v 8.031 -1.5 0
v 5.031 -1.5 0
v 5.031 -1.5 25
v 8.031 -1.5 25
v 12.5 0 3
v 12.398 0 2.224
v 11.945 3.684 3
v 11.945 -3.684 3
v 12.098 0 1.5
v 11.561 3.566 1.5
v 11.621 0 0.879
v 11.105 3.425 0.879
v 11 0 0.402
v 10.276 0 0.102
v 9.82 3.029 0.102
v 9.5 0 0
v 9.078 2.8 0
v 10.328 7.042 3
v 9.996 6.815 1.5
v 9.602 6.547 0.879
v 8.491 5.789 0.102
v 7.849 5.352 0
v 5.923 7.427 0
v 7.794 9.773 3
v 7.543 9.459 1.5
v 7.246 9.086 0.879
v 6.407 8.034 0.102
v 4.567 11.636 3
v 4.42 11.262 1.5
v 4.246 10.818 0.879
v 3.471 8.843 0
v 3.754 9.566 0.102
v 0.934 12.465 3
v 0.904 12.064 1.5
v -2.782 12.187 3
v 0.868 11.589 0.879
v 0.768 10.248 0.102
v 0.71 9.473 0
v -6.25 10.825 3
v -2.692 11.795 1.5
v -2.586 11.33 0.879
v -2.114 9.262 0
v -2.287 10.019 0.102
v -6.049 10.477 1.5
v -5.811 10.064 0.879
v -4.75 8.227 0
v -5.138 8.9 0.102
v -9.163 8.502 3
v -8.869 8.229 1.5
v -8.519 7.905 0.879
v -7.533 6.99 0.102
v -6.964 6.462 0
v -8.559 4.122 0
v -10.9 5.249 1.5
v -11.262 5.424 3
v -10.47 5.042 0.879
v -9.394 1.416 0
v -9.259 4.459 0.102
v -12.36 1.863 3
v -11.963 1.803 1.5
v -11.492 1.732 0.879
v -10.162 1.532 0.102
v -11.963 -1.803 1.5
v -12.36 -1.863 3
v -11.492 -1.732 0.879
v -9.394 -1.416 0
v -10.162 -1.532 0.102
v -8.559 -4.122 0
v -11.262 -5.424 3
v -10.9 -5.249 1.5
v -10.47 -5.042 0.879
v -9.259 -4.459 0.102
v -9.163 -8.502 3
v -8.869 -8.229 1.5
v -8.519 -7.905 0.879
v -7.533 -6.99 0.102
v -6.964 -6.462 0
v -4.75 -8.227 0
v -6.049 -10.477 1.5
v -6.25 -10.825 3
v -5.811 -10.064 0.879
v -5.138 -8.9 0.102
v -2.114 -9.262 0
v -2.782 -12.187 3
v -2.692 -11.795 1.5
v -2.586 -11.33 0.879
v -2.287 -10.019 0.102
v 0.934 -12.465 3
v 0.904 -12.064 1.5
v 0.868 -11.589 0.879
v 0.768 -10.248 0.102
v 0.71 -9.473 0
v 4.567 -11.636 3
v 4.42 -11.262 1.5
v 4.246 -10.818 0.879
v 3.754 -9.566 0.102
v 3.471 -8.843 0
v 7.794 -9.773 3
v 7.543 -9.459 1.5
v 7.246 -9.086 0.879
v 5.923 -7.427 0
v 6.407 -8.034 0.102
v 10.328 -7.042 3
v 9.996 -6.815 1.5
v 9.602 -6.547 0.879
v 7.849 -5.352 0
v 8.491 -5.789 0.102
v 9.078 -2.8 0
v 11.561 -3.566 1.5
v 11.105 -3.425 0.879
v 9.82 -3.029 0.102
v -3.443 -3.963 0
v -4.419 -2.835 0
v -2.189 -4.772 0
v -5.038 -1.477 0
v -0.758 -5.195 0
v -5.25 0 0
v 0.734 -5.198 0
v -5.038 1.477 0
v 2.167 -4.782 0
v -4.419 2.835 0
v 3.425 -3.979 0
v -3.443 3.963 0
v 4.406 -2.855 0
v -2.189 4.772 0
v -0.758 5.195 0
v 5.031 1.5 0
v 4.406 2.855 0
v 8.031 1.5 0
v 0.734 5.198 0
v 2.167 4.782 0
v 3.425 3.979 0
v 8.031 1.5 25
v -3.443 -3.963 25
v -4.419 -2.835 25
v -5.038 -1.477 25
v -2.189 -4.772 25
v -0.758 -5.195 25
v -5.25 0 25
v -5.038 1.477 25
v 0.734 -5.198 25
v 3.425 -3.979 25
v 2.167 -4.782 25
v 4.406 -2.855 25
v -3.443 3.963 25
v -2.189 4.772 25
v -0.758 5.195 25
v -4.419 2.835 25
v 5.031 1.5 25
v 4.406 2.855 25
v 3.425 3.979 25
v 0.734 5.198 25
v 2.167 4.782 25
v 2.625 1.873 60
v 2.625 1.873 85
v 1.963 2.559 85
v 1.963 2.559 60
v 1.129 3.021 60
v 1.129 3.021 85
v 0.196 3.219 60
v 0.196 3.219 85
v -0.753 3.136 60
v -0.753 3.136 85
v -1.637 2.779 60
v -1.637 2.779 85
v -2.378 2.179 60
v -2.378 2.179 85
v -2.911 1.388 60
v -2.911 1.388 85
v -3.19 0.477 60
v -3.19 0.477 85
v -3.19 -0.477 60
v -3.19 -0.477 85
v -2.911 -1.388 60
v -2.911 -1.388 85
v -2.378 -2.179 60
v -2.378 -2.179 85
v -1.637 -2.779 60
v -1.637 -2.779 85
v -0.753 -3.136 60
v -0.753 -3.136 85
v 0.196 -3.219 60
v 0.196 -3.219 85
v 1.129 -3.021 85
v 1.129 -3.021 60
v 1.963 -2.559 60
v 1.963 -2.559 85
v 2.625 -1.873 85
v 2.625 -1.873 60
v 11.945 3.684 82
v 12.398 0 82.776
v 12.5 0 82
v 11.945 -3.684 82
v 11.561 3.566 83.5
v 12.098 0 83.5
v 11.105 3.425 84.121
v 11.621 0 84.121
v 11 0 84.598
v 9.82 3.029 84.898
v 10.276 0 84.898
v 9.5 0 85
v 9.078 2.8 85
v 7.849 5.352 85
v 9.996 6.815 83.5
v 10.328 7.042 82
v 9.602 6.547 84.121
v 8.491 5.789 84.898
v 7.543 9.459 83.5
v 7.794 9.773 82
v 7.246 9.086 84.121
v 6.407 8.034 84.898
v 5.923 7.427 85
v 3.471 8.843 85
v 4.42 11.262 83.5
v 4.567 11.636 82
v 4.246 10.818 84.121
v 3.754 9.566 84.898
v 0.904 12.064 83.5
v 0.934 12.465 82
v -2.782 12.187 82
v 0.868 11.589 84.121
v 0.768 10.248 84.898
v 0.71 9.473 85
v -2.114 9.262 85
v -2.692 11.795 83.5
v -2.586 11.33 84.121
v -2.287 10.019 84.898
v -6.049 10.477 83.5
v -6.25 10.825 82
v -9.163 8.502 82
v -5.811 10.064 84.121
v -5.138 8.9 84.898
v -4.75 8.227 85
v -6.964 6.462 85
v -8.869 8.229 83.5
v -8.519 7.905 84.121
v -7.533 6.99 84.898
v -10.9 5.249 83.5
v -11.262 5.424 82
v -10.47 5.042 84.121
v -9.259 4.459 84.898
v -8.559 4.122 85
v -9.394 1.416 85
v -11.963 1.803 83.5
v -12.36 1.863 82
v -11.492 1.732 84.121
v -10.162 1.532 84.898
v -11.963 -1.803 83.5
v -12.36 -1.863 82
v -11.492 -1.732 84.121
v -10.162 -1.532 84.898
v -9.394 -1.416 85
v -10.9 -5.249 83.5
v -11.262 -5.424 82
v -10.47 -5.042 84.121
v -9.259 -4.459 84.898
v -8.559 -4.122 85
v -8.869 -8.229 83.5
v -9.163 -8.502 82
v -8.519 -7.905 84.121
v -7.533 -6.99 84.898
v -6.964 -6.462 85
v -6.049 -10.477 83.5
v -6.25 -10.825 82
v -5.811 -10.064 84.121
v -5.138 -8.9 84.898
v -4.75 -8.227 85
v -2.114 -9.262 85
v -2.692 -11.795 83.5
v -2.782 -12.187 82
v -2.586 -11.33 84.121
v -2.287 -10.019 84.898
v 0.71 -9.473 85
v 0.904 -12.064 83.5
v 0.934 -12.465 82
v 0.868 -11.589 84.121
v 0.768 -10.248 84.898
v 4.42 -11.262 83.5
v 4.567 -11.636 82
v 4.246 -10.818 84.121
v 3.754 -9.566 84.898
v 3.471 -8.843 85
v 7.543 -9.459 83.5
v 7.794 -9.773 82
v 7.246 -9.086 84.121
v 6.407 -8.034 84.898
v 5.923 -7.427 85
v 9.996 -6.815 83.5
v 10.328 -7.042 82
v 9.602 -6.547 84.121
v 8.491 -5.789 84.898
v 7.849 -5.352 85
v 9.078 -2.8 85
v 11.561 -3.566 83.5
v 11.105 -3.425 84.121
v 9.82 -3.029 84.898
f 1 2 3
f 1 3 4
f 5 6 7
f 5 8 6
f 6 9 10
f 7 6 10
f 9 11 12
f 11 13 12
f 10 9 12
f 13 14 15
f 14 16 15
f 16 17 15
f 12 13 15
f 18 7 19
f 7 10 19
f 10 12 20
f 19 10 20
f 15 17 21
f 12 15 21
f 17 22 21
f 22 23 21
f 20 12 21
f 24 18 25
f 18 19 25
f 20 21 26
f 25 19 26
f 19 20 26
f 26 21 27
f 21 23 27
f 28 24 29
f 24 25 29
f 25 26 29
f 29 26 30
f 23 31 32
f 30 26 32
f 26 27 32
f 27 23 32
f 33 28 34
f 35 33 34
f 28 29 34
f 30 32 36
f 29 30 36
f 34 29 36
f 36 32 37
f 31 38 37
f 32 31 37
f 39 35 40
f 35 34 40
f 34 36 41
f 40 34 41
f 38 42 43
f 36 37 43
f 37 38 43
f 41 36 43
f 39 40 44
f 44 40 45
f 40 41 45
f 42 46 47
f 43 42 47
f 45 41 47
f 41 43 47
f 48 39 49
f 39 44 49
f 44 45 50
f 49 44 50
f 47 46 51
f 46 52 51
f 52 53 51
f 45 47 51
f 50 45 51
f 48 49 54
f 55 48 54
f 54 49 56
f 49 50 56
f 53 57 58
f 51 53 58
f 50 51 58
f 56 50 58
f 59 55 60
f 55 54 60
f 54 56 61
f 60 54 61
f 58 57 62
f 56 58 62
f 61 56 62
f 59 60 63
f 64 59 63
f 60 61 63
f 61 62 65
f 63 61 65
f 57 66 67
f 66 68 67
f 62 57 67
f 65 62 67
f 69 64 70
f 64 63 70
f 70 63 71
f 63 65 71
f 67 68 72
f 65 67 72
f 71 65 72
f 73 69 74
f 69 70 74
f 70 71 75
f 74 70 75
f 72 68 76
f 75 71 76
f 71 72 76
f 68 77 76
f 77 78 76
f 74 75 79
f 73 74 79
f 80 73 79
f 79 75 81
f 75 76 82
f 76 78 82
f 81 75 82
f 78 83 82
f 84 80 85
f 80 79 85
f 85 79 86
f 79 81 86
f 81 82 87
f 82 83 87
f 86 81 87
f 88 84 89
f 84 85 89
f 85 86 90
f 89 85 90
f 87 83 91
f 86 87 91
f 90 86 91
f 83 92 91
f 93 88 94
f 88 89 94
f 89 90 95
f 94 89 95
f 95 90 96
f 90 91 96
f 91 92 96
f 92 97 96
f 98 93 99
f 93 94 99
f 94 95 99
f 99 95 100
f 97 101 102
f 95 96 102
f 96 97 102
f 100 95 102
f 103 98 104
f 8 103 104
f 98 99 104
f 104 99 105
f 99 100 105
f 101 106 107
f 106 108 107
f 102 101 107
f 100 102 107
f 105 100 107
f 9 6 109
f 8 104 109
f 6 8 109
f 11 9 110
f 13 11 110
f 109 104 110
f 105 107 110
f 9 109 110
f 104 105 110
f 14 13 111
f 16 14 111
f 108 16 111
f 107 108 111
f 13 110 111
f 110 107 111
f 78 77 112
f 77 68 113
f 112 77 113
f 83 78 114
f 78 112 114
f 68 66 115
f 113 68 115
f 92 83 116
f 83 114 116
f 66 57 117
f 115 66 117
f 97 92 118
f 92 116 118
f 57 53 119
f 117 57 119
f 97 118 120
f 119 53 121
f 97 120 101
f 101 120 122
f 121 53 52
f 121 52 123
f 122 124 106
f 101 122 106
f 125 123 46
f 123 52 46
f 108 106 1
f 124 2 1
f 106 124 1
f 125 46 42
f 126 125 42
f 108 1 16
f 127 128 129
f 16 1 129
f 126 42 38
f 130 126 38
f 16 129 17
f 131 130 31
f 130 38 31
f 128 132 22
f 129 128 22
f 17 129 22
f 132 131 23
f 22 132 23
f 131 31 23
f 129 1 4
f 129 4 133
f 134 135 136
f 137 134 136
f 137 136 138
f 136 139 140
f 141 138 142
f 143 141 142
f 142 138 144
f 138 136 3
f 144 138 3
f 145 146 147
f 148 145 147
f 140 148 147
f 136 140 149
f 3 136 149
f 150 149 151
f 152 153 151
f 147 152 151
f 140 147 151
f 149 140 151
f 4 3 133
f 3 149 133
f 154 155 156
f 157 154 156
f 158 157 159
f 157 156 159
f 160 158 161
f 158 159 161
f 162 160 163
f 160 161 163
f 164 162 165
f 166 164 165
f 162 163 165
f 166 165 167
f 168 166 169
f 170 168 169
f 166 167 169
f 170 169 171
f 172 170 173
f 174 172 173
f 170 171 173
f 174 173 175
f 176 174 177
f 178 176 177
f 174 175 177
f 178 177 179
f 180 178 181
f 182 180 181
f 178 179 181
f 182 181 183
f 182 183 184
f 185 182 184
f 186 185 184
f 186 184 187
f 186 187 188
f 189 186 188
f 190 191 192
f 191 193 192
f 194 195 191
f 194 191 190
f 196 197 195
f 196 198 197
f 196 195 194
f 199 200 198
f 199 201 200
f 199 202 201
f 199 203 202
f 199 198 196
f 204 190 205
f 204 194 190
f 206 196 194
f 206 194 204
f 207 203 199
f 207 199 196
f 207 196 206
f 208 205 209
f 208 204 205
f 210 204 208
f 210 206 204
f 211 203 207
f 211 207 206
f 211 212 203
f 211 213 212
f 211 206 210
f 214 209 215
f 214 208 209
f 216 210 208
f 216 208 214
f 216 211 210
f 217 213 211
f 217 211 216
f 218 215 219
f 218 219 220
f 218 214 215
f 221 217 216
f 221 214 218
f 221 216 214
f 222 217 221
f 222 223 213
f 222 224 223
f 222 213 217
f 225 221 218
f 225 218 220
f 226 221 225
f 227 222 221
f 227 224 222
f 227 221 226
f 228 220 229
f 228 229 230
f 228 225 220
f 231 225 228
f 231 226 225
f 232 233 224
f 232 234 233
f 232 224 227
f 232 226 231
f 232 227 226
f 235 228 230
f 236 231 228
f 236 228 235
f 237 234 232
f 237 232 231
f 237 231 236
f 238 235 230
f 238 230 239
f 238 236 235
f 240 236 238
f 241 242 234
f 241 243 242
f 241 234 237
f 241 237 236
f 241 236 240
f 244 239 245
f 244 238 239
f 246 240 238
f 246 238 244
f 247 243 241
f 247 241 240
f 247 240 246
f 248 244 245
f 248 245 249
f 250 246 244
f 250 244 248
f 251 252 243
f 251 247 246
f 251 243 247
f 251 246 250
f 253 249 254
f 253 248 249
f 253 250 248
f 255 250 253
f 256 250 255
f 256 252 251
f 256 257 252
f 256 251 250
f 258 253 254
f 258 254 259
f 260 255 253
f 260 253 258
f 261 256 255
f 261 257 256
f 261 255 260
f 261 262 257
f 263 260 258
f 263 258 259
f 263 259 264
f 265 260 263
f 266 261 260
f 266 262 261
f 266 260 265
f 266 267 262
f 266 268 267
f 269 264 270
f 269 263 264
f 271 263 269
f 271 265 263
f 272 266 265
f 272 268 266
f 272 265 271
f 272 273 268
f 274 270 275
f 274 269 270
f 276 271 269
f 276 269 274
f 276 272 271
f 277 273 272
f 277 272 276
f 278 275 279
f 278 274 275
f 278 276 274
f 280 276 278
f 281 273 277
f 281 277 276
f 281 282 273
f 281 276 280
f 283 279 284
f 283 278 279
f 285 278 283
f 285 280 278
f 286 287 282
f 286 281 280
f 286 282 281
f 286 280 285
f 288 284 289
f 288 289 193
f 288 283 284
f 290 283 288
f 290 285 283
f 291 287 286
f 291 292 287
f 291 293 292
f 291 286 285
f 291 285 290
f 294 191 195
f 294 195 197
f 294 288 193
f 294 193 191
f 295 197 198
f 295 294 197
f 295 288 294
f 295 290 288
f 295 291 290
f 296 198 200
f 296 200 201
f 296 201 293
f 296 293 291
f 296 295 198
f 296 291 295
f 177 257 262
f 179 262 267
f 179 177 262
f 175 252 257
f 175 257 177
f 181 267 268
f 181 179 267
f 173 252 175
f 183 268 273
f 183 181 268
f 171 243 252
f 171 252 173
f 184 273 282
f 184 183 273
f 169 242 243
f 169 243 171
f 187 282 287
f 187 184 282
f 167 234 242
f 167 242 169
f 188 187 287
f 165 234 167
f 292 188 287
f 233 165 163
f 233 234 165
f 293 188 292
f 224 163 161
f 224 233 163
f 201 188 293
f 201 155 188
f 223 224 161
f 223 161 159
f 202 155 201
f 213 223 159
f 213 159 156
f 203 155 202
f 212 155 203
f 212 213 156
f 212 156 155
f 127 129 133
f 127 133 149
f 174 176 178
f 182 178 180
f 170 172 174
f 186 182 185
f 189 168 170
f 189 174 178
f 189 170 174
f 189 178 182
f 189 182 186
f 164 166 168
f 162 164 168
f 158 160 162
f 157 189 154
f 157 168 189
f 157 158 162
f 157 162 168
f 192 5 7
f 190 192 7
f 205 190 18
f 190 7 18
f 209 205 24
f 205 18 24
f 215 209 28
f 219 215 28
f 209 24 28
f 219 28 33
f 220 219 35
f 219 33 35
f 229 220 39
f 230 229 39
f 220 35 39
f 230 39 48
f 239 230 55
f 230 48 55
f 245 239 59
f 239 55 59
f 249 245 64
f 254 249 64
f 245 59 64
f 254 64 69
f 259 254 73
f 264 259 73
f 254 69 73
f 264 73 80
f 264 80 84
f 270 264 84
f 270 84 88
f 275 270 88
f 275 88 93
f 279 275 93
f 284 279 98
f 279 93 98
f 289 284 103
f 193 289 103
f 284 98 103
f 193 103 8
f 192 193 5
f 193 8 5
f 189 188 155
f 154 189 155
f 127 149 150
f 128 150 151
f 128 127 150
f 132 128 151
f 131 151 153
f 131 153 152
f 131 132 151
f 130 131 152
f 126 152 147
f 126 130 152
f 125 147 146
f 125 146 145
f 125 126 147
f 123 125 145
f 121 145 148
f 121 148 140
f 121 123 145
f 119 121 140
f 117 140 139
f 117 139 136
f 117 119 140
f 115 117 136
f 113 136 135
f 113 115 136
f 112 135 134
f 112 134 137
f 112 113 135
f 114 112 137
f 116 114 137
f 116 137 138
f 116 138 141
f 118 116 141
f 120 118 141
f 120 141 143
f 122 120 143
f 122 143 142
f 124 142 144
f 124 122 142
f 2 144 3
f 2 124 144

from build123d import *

# Parameters (mm, degrees)
F0_R     = 12.5
F1_DEPTH = 85
F2_DEPTH = 25
F4_DEPTH = 25
F5_R     = 3


with BuildPart() as f1:
    # F0 (on Top) → F1 (new body)
    with BuildSketch(Plane.XY):
        Circle(F0_R)
        with BuildLine():
            ThreePointArc((5.031153, -1.5), (-5.25, 0), (5.031153, 1.5))
            Line((5.031153, 1.5), (8.031153, 1.5))
            Line((8.031153, 1.5), (8.031153, -1.5))
            Line((8.031153, -1.5), (5.031153, -1.5))
        make_face(mode=Mode.SUBTRACT)
        with BuildLine():
            Line((5.031153, -1.5), (5.031153, 1.5))
            ThreePointArc((5.031153, 1.5), (-5.25, 0), (5.031153, -1.5))
        make_face()
        with BuildLine():
            ThreePointArc((5.031153, 1.5), (5.195, 0.75794), (5.25, 0))
            ThreePointArc((5.25, 0), (5.195, -0.75794), (5.031153, -1.5))
            Line((5.031153, -1.5), (8.031153, -1.5))
            Line((8.031153, -1.5), (8.031153, 1.5))
            Line((8.031153, 1.5), (5.031153, 1.5))
        make_face()
        with BuildLine():
            ThreePointArc((5.031153, -1.5), (5.195, -0.75794), (5.25, 0))
            ThreePointArc((5.25, 0), (5.195, 0.75794), (5.031153, 1.5))
            Line((5.031153, 1.5), (5.031153, -1.5))
        make_face()
    extrude(amount=F1_DEPTH)

    # F0 (on Top) → F2 (cut)
    with BuildSketch(Plane.XY):
        with BuildLine():
            Line((5.031153, -1.5), (5.031153, 1.5))
            ThreePointArc((5.031153, 1.5), (-5.25, 0), (5.031153, -1.5))
        make_face()
        with BuildLine():
            ThreePointArc((5.031153, -1.5), (5.195, -0.75794), (5.25, 0))
            ThreePointArc((5.25, 0), (5.195, 0.75794), (5.031153, 1.5))
            Line((5.031153, 1.5), (5.031153, -1.5))
        make_face()
        with BuildLine():
            ThreePointArc((5.031153, 1.5), (5.195, 0.75794), (5.25, 0))
            ThreePointArc((5.25, 0), (5.195, -0.75794), (5.031153, -1.5))
            Line((5.031153, -1.5), (8.031153, -1.5))
            Line((8.031153, -1.5), (8.031153, 1.5))
            Line((8.031153, 1.5), (5.031153, 1.5))
        make_face()
    extrude(amount=F2_DEPTH, mode=Mode.SUBTRACT)

    # F3 (on face) → F4 (cut)
    with BuildSketch(Plane.XY.offset(85)):
        with BuildLine():
            Line((2.625, -1.873499), (2.625, 1.873499))
            ThreePointArc((2.625, 1.873499), (-3.225, 0), (2.625, -1.873499))
        make_face()
    extrude(amount=-F4_DEPTH, mode=Mode.SUBTRACT)

    # F5
    f5_edges = [f1.edges().sort_by_distance(p)[0] for p in [
        (-12.5, 0, 85),
        (-12.5, 0, 0),
    ]]
    fillet(f5_edges, radius=F5_R)


solid = f1.part
